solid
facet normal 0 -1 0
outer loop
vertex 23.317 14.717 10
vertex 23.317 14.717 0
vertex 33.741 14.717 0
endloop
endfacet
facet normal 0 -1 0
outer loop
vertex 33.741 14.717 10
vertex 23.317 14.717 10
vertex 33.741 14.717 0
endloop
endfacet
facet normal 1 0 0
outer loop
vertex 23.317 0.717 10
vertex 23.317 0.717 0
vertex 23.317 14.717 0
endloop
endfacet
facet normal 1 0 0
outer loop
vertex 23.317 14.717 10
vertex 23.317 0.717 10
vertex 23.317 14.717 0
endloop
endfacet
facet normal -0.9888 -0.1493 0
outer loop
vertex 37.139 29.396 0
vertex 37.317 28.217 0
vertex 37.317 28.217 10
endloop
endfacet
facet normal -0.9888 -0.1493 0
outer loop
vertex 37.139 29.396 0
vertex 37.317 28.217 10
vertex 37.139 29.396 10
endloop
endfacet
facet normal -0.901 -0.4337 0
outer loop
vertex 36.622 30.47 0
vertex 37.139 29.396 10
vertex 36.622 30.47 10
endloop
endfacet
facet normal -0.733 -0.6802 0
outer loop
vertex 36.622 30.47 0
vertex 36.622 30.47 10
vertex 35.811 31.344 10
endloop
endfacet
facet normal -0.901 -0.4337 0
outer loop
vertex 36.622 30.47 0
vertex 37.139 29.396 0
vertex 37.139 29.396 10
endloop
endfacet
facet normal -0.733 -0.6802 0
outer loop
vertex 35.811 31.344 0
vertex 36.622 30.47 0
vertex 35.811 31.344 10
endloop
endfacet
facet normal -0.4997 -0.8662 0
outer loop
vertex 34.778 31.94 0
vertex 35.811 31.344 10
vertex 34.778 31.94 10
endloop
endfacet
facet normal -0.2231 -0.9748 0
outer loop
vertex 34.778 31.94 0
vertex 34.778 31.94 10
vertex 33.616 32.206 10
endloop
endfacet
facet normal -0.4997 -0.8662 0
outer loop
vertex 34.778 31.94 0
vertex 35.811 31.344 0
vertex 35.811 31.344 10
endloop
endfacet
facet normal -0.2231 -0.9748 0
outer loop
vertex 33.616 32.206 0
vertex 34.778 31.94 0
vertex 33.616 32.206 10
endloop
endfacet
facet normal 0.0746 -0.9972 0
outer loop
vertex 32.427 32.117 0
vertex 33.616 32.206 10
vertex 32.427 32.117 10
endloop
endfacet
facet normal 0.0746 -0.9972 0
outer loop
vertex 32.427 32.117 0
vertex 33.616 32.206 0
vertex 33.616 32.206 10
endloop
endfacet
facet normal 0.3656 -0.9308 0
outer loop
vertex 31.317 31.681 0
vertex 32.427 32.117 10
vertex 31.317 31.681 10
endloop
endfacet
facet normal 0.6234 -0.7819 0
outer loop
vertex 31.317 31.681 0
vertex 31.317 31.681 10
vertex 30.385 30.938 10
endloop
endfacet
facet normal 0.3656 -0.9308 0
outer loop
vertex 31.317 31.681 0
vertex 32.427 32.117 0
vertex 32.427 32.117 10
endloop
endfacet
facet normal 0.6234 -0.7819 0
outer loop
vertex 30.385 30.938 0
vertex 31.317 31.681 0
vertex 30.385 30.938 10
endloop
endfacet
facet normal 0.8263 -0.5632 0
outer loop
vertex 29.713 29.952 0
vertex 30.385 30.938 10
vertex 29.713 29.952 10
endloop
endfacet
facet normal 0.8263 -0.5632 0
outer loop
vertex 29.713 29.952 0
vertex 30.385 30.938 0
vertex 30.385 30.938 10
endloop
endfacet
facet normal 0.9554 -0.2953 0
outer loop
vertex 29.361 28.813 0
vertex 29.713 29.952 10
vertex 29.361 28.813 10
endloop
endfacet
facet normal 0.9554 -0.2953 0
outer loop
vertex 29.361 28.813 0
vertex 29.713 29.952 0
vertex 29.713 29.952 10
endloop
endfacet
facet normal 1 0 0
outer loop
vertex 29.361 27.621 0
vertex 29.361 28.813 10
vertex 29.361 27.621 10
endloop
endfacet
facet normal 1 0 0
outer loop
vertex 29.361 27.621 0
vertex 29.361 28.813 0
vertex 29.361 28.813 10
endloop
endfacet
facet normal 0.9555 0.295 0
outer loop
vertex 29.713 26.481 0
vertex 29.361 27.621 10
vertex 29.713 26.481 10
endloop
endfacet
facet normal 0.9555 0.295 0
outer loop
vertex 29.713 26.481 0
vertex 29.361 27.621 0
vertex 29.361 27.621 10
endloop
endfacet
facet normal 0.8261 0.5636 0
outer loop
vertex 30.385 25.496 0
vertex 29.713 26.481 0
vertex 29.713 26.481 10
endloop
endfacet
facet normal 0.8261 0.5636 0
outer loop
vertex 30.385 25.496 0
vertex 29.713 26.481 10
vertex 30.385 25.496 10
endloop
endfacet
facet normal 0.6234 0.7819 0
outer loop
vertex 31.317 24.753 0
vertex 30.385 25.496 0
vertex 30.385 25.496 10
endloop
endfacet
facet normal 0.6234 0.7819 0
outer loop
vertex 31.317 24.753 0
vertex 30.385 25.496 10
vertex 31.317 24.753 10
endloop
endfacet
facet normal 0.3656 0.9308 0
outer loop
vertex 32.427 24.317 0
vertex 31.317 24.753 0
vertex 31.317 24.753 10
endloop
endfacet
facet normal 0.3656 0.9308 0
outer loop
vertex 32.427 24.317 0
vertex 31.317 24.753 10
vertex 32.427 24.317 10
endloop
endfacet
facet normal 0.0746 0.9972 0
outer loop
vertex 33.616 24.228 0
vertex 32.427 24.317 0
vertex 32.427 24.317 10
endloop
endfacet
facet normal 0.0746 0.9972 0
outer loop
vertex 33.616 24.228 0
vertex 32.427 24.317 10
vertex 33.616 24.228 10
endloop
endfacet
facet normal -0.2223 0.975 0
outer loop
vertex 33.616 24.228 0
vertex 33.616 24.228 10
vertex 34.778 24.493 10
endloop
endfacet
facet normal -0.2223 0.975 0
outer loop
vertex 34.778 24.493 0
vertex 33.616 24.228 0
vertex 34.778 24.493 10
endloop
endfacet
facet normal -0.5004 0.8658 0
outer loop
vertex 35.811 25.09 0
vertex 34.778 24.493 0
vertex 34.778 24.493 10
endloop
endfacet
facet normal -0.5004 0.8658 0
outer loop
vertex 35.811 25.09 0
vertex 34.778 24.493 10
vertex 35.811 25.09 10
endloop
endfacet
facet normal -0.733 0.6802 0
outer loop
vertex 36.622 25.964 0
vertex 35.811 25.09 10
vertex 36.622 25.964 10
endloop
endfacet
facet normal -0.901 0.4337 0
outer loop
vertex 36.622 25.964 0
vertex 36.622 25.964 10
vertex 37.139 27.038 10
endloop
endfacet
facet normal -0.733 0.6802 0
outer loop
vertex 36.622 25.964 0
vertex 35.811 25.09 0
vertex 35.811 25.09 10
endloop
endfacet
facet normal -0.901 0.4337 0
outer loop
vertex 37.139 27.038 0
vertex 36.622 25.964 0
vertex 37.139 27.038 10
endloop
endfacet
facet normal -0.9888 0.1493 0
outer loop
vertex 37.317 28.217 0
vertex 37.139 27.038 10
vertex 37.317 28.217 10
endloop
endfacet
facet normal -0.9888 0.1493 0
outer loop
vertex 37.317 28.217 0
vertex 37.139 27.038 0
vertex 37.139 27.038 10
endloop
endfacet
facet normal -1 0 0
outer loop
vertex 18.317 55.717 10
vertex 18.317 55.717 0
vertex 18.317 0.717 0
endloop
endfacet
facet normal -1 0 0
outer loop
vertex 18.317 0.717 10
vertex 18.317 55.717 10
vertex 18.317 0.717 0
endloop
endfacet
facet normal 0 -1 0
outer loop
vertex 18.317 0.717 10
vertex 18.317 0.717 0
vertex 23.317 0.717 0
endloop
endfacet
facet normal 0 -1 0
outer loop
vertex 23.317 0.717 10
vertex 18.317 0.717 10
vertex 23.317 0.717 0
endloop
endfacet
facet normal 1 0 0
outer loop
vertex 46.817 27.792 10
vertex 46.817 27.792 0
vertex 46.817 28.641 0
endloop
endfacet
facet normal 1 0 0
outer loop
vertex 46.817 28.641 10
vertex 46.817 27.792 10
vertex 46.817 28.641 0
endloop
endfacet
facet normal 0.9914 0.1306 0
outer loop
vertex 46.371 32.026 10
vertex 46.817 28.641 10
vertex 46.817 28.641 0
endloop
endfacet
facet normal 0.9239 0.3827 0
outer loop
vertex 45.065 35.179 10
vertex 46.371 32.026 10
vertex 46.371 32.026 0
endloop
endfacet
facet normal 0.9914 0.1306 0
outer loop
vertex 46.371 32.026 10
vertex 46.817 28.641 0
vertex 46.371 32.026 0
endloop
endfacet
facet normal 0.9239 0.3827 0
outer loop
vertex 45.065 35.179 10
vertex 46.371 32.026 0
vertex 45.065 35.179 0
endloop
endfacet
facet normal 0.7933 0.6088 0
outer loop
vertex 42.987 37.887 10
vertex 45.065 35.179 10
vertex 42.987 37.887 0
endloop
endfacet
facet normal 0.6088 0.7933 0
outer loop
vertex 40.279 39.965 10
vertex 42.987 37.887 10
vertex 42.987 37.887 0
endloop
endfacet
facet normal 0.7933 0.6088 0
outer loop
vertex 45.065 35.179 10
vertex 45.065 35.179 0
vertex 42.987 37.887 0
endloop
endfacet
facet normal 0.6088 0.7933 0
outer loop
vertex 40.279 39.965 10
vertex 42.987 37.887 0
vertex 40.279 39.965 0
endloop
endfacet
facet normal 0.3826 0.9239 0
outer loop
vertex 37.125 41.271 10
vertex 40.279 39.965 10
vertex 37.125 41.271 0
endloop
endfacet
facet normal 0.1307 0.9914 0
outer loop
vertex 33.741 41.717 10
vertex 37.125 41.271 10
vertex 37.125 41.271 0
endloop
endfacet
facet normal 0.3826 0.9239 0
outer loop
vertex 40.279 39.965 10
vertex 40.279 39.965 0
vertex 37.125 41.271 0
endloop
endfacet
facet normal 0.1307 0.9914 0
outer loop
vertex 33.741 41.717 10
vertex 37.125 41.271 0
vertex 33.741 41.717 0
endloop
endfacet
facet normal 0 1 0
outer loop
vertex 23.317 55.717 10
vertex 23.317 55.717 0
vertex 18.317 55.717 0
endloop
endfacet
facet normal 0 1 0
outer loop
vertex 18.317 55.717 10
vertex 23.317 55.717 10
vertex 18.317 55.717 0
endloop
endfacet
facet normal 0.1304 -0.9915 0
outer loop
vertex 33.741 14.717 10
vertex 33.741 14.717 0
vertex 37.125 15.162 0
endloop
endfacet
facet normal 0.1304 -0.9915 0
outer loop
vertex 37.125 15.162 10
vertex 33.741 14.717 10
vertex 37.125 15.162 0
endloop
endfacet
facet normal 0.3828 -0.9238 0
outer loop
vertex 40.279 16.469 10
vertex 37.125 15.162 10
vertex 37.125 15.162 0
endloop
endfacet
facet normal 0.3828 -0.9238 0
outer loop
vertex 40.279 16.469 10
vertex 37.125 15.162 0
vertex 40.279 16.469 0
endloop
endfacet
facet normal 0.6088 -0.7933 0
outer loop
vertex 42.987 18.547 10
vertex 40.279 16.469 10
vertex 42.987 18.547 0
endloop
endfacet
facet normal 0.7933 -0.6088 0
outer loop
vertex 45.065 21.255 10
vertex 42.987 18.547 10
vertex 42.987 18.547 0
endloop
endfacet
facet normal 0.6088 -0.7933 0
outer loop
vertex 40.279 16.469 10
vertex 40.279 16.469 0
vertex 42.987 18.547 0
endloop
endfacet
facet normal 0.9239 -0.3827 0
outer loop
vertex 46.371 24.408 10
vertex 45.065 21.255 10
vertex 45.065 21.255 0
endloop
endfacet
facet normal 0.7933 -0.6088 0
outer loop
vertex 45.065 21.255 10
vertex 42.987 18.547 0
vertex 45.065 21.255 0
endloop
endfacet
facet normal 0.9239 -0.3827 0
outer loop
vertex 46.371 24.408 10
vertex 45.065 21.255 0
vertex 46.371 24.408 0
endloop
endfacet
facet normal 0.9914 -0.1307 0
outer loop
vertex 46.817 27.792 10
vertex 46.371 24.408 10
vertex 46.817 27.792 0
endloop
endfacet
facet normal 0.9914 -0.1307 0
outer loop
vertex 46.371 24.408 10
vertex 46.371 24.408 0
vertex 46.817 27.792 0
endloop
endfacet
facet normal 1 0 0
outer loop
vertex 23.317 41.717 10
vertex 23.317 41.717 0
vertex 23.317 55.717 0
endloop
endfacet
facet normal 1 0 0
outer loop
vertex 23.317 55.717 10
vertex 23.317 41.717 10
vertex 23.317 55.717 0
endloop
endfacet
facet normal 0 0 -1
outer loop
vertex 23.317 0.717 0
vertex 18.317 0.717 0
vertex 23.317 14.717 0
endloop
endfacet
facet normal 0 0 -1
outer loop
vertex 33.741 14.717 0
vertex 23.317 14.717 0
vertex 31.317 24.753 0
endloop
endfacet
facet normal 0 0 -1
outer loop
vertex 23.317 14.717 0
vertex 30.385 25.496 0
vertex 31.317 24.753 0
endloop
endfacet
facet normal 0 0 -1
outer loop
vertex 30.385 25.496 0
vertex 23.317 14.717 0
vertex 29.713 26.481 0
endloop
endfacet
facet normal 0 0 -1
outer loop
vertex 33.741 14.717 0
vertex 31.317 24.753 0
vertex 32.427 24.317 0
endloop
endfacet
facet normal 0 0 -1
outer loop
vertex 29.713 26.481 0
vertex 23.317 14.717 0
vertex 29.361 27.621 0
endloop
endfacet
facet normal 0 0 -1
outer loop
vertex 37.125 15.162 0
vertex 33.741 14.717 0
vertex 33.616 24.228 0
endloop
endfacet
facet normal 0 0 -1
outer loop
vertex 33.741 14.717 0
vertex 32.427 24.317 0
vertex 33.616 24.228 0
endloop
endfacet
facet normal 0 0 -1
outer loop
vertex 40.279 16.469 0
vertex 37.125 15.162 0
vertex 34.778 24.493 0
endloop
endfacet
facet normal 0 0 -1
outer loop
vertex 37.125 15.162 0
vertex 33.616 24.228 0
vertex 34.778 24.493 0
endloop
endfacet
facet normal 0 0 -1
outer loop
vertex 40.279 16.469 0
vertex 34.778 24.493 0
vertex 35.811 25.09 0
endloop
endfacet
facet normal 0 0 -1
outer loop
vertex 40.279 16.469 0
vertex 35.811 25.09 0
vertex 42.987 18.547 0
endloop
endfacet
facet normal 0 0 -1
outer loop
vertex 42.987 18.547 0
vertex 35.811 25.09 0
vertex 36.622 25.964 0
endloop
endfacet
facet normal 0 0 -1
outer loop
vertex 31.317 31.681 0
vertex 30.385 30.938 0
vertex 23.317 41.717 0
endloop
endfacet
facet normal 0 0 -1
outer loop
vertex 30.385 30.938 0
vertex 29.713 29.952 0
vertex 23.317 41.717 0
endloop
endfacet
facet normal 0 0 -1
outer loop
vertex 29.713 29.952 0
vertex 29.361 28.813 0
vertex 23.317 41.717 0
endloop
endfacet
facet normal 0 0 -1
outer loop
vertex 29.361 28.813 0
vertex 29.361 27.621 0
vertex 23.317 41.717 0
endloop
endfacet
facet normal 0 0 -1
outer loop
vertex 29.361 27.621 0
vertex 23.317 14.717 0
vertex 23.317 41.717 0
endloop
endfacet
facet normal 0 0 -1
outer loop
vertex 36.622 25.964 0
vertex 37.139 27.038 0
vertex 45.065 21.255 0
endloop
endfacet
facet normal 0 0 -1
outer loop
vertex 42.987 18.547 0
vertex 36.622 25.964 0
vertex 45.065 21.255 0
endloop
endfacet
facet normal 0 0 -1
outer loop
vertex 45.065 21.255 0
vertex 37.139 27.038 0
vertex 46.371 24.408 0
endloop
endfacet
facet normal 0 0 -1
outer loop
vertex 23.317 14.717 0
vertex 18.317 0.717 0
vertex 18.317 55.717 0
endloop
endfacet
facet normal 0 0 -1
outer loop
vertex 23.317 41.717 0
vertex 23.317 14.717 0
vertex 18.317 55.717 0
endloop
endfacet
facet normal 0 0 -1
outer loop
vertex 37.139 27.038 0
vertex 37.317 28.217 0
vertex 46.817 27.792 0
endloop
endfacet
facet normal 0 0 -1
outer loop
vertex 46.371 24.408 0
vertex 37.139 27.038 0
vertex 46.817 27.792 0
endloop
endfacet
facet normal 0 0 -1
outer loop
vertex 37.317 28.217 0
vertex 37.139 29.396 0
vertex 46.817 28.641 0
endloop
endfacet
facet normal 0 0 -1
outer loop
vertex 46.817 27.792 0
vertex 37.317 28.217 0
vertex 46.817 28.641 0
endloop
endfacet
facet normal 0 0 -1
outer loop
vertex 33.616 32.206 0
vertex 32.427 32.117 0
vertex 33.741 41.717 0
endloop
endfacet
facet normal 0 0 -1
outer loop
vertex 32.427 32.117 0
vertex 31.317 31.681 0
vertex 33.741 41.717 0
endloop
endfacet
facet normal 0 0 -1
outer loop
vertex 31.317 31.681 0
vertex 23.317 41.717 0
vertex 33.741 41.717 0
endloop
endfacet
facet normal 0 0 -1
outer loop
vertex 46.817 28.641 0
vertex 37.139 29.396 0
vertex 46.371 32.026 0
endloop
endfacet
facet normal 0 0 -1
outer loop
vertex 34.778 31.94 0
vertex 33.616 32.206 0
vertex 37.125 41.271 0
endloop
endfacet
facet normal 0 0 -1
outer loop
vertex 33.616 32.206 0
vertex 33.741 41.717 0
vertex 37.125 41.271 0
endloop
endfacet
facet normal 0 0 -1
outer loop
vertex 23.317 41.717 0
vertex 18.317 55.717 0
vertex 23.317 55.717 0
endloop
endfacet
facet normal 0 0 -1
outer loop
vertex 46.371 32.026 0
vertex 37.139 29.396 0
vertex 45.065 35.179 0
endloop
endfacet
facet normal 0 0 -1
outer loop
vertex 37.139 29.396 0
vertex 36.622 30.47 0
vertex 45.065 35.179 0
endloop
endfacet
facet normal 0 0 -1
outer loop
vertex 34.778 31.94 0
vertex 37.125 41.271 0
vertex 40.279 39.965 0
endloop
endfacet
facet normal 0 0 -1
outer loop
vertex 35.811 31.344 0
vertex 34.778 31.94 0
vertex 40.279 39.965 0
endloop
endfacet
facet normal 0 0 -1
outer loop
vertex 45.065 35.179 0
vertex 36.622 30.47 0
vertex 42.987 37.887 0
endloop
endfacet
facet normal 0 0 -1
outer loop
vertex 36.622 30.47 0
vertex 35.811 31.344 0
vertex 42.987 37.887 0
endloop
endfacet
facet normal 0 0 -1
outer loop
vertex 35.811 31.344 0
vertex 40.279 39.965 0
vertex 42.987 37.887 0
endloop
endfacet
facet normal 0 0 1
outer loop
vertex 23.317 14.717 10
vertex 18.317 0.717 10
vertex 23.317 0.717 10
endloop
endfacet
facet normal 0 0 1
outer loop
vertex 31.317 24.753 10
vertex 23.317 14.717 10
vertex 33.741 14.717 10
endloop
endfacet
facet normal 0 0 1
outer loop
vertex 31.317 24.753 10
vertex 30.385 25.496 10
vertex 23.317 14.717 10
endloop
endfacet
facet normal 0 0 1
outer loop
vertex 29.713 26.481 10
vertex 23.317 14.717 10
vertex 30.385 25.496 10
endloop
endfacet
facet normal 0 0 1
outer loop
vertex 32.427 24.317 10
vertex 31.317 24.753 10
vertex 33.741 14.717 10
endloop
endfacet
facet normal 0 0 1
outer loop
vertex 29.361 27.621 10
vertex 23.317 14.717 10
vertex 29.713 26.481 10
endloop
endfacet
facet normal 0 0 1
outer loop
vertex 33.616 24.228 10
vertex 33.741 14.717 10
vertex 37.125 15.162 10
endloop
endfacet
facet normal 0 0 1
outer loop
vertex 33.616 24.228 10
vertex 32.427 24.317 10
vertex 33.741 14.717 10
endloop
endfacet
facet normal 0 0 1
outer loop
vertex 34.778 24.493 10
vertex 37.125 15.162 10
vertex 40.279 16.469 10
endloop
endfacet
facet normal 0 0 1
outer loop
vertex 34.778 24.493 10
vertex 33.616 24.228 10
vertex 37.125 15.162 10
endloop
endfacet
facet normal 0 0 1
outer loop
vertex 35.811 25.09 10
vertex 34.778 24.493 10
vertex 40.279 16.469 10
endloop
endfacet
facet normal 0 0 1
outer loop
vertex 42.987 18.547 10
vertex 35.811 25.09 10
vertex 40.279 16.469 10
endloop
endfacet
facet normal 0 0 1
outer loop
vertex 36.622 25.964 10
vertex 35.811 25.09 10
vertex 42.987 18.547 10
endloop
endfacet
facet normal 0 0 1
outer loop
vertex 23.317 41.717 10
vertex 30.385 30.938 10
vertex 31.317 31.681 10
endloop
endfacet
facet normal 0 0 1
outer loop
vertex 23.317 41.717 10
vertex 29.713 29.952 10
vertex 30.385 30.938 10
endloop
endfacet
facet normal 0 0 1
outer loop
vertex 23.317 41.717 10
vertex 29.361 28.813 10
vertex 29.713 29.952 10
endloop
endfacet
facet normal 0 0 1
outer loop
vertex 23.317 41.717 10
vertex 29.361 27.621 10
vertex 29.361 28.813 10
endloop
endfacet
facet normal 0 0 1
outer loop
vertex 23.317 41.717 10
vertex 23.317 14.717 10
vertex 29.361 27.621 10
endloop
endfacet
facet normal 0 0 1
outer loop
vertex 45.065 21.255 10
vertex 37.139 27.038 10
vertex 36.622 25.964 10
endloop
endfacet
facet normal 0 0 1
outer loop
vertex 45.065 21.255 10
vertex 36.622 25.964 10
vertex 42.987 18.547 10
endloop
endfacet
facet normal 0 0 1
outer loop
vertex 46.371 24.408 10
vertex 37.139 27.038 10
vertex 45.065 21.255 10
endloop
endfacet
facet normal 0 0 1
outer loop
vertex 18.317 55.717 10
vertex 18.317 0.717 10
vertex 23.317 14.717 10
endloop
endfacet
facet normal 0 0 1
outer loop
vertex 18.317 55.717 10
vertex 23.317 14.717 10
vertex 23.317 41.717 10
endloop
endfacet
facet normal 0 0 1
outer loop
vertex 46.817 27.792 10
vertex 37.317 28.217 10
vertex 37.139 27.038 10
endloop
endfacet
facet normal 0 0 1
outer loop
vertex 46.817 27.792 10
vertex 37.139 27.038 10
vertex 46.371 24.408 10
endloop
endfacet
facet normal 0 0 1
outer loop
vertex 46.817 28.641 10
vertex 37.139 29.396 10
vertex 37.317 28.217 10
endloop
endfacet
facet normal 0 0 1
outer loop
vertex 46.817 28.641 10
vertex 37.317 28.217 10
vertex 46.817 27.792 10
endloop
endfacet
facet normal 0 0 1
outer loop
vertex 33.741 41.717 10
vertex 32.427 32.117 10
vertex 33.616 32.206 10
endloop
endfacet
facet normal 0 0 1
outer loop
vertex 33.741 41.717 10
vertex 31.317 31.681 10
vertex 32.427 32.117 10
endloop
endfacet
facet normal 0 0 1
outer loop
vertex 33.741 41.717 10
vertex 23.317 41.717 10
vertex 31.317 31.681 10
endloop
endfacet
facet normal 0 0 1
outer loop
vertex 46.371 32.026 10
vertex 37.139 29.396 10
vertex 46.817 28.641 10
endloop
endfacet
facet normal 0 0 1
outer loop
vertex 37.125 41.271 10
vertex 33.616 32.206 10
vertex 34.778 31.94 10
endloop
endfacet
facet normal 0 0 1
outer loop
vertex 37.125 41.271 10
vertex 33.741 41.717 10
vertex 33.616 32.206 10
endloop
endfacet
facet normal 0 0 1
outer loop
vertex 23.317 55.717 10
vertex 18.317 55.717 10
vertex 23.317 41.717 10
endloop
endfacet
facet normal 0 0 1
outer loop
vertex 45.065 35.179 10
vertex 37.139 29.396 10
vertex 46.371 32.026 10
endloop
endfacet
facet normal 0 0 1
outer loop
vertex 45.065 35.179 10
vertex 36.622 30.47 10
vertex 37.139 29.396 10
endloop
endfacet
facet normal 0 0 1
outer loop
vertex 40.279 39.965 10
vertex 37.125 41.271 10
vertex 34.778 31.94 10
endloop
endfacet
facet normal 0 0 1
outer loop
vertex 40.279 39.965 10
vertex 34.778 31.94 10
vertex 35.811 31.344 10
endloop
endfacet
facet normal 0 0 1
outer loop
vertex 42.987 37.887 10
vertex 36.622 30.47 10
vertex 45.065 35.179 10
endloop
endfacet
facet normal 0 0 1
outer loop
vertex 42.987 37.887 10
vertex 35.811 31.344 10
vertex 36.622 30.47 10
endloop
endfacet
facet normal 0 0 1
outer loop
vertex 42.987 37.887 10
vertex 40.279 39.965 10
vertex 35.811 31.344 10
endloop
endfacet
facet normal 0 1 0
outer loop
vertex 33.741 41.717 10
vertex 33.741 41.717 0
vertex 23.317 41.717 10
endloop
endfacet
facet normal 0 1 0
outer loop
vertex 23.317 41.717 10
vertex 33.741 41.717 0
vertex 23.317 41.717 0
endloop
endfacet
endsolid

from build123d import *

# Parameters (mm, degrees)
SKETCH_R      = 4
EXTRUDE_DEPTH = 10


with BuildPart() as part:
    # Sketch → Extrude (new body)
    with BuildSketch(Plane.XY):
        with BuildLine():
            Line((18.316745, 55.716924), (18.316745, 0.716924))
            Line((18.316745, 0.716924), (23.316745, 0.716924))
            Line((23.316745, 0.716924), (23.316745, 14.716924))
            Line((23.316745, 14.716924), (33.741258, 14.716924))
            ThreePointArc((33.741258, 14.716924), (42.987024, 18.546645), (46.816745, 27.792411))
            Line((46.816745, 27.792411), (46.816745, 28.641436))
            ThreePointArc((46.816745, 28.641436), (42.987024, 37.887202), (33.741258, 41.716924))
            Line((33.741258, 41.716924), (23.316745, 41.716924))
            Line((23.316745, 41.716924), (23.316745, 55.716924))
            Line((23.316745, 55.716924), (18.316745, 55.716924))
        make_face()
        with Locations((33.316745, 28.216924)):
            Circle(SKETCH_R, mode=Mode.SUBTRACT)
    extrude(amount=EXTRUDE_DEPTH)


solid = part.part
